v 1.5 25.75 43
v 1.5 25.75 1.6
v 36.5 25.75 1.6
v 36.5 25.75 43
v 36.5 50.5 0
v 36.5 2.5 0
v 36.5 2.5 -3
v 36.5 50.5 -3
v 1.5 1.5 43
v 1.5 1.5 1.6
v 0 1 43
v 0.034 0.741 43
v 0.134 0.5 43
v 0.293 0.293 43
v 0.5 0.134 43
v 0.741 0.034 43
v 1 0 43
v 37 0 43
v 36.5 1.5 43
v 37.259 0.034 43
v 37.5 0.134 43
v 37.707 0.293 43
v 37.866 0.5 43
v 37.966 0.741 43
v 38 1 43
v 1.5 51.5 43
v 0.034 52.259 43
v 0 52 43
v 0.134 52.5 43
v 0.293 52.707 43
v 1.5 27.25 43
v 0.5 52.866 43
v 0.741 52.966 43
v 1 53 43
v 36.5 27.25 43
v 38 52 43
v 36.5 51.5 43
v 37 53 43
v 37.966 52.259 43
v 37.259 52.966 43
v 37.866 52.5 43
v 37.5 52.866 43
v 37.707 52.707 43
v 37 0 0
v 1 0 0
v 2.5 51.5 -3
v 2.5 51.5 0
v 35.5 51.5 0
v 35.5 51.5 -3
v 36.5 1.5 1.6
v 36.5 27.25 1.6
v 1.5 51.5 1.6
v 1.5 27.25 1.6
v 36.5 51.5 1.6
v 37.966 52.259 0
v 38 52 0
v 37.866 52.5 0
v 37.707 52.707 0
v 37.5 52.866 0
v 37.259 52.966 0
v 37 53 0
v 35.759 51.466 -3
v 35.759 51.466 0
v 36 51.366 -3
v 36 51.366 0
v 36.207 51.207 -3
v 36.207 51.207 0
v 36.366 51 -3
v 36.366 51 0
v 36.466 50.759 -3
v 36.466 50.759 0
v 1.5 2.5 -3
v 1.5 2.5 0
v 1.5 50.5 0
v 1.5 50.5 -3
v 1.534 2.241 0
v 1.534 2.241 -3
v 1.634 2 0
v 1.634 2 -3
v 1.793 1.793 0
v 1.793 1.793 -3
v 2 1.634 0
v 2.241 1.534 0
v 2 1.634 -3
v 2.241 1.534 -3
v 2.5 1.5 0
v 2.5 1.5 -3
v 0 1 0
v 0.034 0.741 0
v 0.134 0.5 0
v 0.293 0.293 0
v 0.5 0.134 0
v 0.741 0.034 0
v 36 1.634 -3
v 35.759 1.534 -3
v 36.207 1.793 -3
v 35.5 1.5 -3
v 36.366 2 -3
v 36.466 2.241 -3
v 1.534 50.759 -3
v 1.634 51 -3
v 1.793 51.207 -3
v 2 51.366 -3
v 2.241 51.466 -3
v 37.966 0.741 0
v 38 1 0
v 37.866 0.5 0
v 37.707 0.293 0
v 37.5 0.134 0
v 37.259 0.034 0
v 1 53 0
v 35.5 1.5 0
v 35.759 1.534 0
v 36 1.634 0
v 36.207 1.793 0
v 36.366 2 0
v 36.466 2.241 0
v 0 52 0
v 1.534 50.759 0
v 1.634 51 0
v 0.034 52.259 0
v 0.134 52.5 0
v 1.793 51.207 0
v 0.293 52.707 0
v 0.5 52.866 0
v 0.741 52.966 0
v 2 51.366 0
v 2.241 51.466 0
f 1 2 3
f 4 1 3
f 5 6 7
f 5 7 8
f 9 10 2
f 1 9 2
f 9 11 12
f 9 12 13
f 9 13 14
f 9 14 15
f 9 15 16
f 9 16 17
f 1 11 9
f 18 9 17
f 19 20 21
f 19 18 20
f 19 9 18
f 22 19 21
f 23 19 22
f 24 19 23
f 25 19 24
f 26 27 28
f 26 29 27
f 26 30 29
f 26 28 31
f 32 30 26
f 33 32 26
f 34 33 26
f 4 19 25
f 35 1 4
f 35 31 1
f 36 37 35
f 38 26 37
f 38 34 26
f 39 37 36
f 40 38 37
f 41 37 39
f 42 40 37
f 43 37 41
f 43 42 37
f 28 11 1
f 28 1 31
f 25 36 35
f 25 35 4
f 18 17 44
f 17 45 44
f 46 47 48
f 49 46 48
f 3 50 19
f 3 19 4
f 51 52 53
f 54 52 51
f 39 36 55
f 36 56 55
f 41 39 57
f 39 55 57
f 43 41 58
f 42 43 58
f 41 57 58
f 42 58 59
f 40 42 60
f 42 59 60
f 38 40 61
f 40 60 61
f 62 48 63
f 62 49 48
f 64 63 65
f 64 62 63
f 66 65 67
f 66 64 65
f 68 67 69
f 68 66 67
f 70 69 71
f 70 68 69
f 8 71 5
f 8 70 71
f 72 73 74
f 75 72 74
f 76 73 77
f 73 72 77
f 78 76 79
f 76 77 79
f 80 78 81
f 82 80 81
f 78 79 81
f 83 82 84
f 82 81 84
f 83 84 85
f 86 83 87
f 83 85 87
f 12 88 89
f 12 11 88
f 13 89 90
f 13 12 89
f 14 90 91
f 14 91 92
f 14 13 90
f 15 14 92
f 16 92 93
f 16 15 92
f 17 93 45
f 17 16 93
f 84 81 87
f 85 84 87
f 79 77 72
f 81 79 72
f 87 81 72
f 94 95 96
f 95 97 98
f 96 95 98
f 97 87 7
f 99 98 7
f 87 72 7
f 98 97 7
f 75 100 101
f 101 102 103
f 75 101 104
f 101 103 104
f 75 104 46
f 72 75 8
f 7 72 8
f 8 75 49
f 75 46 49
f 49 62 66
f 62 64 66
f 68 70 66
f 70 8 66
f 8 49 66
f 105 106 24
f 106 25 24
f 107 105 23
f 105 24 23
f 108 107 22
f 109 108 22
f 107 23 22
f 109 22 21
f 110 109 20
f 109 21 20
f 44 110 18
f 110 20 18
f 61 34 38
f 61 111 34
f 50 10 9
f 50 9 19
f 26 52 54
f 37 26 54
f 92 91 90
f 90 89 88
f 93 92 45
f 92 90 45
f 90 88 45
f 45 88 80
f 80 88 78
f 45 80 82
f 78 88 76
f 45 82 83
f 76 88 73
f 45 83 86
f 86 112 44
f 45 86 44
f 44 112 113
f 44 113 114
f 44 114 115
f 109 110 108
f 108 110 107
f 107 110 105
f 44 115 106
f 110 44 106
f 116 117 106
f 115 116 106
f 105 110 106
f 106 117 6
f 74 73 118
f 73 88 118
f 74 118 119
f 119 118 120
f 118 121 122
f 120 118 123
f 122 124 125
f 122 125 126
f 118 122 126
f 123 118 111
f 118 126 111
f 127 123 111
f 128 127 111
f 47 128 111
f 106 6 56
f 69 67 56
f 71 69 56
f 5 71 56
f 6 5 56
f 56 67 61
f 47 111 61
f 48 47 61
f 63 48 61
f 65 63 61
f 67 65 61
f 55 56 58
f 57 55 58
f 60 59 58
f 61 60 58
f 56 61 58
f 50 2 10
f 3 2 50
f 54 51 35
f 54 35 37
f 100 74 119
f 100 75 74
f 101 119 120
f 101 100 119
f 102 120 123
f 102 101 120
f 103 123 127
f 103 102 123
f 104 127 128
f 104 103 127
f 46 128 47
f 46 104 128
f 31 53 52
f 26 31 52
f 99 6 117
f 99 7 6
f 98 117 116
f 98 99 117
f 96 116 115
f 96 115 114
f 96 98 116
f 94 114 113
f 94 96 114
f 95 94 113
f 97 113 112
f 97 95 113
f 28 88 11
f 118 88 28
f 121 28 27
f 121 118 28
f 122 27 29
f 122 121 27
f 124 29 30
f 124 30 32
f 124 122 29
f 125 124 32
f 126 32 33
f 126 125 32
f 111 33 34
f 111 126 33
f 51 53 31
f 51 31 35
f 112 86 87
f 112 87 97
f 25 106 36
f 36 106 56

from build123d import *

# Parameters (mm, degrees)
F0_W     = 35
F0_H     = 50
F1_DEPTH = 3
F0_W_2   = 38
F0_H_2   = 53
F2_DEPTH = 1.6
F3_DEPTH = 43
F4_R     = 1
F5_W     = 35
F5_H     = 1.5
F6_DEPTH = 41.4


with BuildPart() as f1:
    # F0 (on Top) → F1 (new body)
    with BuildSketch(Plane.XY):
        with Locations((19, 26.5)):
            Rectangle(F0_W, F0_H)
    extrude(amount=-F1_DEPTH)

    # F0 (on Top) → F2 (join)
    with BuildSketch(Plane.XY):
        with Locations((19, 26.5)):
            Rectangle(F0_W_2, F0_H_2)
        with Locations((19, 26.5)):
            Rectangle(F0_W, F0_H, mode=Mode.SUBTRACT)
        with Locations((19, 26.5)):
            Rectangle(F0_W, F0_H)
    extrude(amount=F2_DEPTH)

    # F0 (on Top) → F3 (join)
    with BuildSketch(Plane.XY):
        with Locations((19, 26.5)):
            Rectangle(F0_W_2, F0_H_2)
        with Locations((19, 26.5)):
            Rectangle(F0_W, F0_H, mode=Mode.SUBTRACT)
    extrude(amount=F3_DEPTH)

    # F4
    f4_edges = [f1.edges().sort_by_distance(p)[0] for p in [
        (36.5, 1.5, -1.5),
        (1.5, 1.5, -1.5),
        (1.5, 51.5, -1.5),
        (36.5, 51.5, -1.5),
        (0, 53, 21.5),
        (38, 53, 21.5),
        (0, 0, 21.5),
        (38, 0, 21.5),
    ]]
    fillet(f4_edges, radius=F4_R)

    # F5 (on face) → F6 (join, through all)
    with BuildSketch(Plane.XY.offset(1.6)):
        with Locations((19, 26.5)):
            Rectangle(F5_W, F5_H)
    extrude(amount=F6_DEPTH)


solid = f1.part
